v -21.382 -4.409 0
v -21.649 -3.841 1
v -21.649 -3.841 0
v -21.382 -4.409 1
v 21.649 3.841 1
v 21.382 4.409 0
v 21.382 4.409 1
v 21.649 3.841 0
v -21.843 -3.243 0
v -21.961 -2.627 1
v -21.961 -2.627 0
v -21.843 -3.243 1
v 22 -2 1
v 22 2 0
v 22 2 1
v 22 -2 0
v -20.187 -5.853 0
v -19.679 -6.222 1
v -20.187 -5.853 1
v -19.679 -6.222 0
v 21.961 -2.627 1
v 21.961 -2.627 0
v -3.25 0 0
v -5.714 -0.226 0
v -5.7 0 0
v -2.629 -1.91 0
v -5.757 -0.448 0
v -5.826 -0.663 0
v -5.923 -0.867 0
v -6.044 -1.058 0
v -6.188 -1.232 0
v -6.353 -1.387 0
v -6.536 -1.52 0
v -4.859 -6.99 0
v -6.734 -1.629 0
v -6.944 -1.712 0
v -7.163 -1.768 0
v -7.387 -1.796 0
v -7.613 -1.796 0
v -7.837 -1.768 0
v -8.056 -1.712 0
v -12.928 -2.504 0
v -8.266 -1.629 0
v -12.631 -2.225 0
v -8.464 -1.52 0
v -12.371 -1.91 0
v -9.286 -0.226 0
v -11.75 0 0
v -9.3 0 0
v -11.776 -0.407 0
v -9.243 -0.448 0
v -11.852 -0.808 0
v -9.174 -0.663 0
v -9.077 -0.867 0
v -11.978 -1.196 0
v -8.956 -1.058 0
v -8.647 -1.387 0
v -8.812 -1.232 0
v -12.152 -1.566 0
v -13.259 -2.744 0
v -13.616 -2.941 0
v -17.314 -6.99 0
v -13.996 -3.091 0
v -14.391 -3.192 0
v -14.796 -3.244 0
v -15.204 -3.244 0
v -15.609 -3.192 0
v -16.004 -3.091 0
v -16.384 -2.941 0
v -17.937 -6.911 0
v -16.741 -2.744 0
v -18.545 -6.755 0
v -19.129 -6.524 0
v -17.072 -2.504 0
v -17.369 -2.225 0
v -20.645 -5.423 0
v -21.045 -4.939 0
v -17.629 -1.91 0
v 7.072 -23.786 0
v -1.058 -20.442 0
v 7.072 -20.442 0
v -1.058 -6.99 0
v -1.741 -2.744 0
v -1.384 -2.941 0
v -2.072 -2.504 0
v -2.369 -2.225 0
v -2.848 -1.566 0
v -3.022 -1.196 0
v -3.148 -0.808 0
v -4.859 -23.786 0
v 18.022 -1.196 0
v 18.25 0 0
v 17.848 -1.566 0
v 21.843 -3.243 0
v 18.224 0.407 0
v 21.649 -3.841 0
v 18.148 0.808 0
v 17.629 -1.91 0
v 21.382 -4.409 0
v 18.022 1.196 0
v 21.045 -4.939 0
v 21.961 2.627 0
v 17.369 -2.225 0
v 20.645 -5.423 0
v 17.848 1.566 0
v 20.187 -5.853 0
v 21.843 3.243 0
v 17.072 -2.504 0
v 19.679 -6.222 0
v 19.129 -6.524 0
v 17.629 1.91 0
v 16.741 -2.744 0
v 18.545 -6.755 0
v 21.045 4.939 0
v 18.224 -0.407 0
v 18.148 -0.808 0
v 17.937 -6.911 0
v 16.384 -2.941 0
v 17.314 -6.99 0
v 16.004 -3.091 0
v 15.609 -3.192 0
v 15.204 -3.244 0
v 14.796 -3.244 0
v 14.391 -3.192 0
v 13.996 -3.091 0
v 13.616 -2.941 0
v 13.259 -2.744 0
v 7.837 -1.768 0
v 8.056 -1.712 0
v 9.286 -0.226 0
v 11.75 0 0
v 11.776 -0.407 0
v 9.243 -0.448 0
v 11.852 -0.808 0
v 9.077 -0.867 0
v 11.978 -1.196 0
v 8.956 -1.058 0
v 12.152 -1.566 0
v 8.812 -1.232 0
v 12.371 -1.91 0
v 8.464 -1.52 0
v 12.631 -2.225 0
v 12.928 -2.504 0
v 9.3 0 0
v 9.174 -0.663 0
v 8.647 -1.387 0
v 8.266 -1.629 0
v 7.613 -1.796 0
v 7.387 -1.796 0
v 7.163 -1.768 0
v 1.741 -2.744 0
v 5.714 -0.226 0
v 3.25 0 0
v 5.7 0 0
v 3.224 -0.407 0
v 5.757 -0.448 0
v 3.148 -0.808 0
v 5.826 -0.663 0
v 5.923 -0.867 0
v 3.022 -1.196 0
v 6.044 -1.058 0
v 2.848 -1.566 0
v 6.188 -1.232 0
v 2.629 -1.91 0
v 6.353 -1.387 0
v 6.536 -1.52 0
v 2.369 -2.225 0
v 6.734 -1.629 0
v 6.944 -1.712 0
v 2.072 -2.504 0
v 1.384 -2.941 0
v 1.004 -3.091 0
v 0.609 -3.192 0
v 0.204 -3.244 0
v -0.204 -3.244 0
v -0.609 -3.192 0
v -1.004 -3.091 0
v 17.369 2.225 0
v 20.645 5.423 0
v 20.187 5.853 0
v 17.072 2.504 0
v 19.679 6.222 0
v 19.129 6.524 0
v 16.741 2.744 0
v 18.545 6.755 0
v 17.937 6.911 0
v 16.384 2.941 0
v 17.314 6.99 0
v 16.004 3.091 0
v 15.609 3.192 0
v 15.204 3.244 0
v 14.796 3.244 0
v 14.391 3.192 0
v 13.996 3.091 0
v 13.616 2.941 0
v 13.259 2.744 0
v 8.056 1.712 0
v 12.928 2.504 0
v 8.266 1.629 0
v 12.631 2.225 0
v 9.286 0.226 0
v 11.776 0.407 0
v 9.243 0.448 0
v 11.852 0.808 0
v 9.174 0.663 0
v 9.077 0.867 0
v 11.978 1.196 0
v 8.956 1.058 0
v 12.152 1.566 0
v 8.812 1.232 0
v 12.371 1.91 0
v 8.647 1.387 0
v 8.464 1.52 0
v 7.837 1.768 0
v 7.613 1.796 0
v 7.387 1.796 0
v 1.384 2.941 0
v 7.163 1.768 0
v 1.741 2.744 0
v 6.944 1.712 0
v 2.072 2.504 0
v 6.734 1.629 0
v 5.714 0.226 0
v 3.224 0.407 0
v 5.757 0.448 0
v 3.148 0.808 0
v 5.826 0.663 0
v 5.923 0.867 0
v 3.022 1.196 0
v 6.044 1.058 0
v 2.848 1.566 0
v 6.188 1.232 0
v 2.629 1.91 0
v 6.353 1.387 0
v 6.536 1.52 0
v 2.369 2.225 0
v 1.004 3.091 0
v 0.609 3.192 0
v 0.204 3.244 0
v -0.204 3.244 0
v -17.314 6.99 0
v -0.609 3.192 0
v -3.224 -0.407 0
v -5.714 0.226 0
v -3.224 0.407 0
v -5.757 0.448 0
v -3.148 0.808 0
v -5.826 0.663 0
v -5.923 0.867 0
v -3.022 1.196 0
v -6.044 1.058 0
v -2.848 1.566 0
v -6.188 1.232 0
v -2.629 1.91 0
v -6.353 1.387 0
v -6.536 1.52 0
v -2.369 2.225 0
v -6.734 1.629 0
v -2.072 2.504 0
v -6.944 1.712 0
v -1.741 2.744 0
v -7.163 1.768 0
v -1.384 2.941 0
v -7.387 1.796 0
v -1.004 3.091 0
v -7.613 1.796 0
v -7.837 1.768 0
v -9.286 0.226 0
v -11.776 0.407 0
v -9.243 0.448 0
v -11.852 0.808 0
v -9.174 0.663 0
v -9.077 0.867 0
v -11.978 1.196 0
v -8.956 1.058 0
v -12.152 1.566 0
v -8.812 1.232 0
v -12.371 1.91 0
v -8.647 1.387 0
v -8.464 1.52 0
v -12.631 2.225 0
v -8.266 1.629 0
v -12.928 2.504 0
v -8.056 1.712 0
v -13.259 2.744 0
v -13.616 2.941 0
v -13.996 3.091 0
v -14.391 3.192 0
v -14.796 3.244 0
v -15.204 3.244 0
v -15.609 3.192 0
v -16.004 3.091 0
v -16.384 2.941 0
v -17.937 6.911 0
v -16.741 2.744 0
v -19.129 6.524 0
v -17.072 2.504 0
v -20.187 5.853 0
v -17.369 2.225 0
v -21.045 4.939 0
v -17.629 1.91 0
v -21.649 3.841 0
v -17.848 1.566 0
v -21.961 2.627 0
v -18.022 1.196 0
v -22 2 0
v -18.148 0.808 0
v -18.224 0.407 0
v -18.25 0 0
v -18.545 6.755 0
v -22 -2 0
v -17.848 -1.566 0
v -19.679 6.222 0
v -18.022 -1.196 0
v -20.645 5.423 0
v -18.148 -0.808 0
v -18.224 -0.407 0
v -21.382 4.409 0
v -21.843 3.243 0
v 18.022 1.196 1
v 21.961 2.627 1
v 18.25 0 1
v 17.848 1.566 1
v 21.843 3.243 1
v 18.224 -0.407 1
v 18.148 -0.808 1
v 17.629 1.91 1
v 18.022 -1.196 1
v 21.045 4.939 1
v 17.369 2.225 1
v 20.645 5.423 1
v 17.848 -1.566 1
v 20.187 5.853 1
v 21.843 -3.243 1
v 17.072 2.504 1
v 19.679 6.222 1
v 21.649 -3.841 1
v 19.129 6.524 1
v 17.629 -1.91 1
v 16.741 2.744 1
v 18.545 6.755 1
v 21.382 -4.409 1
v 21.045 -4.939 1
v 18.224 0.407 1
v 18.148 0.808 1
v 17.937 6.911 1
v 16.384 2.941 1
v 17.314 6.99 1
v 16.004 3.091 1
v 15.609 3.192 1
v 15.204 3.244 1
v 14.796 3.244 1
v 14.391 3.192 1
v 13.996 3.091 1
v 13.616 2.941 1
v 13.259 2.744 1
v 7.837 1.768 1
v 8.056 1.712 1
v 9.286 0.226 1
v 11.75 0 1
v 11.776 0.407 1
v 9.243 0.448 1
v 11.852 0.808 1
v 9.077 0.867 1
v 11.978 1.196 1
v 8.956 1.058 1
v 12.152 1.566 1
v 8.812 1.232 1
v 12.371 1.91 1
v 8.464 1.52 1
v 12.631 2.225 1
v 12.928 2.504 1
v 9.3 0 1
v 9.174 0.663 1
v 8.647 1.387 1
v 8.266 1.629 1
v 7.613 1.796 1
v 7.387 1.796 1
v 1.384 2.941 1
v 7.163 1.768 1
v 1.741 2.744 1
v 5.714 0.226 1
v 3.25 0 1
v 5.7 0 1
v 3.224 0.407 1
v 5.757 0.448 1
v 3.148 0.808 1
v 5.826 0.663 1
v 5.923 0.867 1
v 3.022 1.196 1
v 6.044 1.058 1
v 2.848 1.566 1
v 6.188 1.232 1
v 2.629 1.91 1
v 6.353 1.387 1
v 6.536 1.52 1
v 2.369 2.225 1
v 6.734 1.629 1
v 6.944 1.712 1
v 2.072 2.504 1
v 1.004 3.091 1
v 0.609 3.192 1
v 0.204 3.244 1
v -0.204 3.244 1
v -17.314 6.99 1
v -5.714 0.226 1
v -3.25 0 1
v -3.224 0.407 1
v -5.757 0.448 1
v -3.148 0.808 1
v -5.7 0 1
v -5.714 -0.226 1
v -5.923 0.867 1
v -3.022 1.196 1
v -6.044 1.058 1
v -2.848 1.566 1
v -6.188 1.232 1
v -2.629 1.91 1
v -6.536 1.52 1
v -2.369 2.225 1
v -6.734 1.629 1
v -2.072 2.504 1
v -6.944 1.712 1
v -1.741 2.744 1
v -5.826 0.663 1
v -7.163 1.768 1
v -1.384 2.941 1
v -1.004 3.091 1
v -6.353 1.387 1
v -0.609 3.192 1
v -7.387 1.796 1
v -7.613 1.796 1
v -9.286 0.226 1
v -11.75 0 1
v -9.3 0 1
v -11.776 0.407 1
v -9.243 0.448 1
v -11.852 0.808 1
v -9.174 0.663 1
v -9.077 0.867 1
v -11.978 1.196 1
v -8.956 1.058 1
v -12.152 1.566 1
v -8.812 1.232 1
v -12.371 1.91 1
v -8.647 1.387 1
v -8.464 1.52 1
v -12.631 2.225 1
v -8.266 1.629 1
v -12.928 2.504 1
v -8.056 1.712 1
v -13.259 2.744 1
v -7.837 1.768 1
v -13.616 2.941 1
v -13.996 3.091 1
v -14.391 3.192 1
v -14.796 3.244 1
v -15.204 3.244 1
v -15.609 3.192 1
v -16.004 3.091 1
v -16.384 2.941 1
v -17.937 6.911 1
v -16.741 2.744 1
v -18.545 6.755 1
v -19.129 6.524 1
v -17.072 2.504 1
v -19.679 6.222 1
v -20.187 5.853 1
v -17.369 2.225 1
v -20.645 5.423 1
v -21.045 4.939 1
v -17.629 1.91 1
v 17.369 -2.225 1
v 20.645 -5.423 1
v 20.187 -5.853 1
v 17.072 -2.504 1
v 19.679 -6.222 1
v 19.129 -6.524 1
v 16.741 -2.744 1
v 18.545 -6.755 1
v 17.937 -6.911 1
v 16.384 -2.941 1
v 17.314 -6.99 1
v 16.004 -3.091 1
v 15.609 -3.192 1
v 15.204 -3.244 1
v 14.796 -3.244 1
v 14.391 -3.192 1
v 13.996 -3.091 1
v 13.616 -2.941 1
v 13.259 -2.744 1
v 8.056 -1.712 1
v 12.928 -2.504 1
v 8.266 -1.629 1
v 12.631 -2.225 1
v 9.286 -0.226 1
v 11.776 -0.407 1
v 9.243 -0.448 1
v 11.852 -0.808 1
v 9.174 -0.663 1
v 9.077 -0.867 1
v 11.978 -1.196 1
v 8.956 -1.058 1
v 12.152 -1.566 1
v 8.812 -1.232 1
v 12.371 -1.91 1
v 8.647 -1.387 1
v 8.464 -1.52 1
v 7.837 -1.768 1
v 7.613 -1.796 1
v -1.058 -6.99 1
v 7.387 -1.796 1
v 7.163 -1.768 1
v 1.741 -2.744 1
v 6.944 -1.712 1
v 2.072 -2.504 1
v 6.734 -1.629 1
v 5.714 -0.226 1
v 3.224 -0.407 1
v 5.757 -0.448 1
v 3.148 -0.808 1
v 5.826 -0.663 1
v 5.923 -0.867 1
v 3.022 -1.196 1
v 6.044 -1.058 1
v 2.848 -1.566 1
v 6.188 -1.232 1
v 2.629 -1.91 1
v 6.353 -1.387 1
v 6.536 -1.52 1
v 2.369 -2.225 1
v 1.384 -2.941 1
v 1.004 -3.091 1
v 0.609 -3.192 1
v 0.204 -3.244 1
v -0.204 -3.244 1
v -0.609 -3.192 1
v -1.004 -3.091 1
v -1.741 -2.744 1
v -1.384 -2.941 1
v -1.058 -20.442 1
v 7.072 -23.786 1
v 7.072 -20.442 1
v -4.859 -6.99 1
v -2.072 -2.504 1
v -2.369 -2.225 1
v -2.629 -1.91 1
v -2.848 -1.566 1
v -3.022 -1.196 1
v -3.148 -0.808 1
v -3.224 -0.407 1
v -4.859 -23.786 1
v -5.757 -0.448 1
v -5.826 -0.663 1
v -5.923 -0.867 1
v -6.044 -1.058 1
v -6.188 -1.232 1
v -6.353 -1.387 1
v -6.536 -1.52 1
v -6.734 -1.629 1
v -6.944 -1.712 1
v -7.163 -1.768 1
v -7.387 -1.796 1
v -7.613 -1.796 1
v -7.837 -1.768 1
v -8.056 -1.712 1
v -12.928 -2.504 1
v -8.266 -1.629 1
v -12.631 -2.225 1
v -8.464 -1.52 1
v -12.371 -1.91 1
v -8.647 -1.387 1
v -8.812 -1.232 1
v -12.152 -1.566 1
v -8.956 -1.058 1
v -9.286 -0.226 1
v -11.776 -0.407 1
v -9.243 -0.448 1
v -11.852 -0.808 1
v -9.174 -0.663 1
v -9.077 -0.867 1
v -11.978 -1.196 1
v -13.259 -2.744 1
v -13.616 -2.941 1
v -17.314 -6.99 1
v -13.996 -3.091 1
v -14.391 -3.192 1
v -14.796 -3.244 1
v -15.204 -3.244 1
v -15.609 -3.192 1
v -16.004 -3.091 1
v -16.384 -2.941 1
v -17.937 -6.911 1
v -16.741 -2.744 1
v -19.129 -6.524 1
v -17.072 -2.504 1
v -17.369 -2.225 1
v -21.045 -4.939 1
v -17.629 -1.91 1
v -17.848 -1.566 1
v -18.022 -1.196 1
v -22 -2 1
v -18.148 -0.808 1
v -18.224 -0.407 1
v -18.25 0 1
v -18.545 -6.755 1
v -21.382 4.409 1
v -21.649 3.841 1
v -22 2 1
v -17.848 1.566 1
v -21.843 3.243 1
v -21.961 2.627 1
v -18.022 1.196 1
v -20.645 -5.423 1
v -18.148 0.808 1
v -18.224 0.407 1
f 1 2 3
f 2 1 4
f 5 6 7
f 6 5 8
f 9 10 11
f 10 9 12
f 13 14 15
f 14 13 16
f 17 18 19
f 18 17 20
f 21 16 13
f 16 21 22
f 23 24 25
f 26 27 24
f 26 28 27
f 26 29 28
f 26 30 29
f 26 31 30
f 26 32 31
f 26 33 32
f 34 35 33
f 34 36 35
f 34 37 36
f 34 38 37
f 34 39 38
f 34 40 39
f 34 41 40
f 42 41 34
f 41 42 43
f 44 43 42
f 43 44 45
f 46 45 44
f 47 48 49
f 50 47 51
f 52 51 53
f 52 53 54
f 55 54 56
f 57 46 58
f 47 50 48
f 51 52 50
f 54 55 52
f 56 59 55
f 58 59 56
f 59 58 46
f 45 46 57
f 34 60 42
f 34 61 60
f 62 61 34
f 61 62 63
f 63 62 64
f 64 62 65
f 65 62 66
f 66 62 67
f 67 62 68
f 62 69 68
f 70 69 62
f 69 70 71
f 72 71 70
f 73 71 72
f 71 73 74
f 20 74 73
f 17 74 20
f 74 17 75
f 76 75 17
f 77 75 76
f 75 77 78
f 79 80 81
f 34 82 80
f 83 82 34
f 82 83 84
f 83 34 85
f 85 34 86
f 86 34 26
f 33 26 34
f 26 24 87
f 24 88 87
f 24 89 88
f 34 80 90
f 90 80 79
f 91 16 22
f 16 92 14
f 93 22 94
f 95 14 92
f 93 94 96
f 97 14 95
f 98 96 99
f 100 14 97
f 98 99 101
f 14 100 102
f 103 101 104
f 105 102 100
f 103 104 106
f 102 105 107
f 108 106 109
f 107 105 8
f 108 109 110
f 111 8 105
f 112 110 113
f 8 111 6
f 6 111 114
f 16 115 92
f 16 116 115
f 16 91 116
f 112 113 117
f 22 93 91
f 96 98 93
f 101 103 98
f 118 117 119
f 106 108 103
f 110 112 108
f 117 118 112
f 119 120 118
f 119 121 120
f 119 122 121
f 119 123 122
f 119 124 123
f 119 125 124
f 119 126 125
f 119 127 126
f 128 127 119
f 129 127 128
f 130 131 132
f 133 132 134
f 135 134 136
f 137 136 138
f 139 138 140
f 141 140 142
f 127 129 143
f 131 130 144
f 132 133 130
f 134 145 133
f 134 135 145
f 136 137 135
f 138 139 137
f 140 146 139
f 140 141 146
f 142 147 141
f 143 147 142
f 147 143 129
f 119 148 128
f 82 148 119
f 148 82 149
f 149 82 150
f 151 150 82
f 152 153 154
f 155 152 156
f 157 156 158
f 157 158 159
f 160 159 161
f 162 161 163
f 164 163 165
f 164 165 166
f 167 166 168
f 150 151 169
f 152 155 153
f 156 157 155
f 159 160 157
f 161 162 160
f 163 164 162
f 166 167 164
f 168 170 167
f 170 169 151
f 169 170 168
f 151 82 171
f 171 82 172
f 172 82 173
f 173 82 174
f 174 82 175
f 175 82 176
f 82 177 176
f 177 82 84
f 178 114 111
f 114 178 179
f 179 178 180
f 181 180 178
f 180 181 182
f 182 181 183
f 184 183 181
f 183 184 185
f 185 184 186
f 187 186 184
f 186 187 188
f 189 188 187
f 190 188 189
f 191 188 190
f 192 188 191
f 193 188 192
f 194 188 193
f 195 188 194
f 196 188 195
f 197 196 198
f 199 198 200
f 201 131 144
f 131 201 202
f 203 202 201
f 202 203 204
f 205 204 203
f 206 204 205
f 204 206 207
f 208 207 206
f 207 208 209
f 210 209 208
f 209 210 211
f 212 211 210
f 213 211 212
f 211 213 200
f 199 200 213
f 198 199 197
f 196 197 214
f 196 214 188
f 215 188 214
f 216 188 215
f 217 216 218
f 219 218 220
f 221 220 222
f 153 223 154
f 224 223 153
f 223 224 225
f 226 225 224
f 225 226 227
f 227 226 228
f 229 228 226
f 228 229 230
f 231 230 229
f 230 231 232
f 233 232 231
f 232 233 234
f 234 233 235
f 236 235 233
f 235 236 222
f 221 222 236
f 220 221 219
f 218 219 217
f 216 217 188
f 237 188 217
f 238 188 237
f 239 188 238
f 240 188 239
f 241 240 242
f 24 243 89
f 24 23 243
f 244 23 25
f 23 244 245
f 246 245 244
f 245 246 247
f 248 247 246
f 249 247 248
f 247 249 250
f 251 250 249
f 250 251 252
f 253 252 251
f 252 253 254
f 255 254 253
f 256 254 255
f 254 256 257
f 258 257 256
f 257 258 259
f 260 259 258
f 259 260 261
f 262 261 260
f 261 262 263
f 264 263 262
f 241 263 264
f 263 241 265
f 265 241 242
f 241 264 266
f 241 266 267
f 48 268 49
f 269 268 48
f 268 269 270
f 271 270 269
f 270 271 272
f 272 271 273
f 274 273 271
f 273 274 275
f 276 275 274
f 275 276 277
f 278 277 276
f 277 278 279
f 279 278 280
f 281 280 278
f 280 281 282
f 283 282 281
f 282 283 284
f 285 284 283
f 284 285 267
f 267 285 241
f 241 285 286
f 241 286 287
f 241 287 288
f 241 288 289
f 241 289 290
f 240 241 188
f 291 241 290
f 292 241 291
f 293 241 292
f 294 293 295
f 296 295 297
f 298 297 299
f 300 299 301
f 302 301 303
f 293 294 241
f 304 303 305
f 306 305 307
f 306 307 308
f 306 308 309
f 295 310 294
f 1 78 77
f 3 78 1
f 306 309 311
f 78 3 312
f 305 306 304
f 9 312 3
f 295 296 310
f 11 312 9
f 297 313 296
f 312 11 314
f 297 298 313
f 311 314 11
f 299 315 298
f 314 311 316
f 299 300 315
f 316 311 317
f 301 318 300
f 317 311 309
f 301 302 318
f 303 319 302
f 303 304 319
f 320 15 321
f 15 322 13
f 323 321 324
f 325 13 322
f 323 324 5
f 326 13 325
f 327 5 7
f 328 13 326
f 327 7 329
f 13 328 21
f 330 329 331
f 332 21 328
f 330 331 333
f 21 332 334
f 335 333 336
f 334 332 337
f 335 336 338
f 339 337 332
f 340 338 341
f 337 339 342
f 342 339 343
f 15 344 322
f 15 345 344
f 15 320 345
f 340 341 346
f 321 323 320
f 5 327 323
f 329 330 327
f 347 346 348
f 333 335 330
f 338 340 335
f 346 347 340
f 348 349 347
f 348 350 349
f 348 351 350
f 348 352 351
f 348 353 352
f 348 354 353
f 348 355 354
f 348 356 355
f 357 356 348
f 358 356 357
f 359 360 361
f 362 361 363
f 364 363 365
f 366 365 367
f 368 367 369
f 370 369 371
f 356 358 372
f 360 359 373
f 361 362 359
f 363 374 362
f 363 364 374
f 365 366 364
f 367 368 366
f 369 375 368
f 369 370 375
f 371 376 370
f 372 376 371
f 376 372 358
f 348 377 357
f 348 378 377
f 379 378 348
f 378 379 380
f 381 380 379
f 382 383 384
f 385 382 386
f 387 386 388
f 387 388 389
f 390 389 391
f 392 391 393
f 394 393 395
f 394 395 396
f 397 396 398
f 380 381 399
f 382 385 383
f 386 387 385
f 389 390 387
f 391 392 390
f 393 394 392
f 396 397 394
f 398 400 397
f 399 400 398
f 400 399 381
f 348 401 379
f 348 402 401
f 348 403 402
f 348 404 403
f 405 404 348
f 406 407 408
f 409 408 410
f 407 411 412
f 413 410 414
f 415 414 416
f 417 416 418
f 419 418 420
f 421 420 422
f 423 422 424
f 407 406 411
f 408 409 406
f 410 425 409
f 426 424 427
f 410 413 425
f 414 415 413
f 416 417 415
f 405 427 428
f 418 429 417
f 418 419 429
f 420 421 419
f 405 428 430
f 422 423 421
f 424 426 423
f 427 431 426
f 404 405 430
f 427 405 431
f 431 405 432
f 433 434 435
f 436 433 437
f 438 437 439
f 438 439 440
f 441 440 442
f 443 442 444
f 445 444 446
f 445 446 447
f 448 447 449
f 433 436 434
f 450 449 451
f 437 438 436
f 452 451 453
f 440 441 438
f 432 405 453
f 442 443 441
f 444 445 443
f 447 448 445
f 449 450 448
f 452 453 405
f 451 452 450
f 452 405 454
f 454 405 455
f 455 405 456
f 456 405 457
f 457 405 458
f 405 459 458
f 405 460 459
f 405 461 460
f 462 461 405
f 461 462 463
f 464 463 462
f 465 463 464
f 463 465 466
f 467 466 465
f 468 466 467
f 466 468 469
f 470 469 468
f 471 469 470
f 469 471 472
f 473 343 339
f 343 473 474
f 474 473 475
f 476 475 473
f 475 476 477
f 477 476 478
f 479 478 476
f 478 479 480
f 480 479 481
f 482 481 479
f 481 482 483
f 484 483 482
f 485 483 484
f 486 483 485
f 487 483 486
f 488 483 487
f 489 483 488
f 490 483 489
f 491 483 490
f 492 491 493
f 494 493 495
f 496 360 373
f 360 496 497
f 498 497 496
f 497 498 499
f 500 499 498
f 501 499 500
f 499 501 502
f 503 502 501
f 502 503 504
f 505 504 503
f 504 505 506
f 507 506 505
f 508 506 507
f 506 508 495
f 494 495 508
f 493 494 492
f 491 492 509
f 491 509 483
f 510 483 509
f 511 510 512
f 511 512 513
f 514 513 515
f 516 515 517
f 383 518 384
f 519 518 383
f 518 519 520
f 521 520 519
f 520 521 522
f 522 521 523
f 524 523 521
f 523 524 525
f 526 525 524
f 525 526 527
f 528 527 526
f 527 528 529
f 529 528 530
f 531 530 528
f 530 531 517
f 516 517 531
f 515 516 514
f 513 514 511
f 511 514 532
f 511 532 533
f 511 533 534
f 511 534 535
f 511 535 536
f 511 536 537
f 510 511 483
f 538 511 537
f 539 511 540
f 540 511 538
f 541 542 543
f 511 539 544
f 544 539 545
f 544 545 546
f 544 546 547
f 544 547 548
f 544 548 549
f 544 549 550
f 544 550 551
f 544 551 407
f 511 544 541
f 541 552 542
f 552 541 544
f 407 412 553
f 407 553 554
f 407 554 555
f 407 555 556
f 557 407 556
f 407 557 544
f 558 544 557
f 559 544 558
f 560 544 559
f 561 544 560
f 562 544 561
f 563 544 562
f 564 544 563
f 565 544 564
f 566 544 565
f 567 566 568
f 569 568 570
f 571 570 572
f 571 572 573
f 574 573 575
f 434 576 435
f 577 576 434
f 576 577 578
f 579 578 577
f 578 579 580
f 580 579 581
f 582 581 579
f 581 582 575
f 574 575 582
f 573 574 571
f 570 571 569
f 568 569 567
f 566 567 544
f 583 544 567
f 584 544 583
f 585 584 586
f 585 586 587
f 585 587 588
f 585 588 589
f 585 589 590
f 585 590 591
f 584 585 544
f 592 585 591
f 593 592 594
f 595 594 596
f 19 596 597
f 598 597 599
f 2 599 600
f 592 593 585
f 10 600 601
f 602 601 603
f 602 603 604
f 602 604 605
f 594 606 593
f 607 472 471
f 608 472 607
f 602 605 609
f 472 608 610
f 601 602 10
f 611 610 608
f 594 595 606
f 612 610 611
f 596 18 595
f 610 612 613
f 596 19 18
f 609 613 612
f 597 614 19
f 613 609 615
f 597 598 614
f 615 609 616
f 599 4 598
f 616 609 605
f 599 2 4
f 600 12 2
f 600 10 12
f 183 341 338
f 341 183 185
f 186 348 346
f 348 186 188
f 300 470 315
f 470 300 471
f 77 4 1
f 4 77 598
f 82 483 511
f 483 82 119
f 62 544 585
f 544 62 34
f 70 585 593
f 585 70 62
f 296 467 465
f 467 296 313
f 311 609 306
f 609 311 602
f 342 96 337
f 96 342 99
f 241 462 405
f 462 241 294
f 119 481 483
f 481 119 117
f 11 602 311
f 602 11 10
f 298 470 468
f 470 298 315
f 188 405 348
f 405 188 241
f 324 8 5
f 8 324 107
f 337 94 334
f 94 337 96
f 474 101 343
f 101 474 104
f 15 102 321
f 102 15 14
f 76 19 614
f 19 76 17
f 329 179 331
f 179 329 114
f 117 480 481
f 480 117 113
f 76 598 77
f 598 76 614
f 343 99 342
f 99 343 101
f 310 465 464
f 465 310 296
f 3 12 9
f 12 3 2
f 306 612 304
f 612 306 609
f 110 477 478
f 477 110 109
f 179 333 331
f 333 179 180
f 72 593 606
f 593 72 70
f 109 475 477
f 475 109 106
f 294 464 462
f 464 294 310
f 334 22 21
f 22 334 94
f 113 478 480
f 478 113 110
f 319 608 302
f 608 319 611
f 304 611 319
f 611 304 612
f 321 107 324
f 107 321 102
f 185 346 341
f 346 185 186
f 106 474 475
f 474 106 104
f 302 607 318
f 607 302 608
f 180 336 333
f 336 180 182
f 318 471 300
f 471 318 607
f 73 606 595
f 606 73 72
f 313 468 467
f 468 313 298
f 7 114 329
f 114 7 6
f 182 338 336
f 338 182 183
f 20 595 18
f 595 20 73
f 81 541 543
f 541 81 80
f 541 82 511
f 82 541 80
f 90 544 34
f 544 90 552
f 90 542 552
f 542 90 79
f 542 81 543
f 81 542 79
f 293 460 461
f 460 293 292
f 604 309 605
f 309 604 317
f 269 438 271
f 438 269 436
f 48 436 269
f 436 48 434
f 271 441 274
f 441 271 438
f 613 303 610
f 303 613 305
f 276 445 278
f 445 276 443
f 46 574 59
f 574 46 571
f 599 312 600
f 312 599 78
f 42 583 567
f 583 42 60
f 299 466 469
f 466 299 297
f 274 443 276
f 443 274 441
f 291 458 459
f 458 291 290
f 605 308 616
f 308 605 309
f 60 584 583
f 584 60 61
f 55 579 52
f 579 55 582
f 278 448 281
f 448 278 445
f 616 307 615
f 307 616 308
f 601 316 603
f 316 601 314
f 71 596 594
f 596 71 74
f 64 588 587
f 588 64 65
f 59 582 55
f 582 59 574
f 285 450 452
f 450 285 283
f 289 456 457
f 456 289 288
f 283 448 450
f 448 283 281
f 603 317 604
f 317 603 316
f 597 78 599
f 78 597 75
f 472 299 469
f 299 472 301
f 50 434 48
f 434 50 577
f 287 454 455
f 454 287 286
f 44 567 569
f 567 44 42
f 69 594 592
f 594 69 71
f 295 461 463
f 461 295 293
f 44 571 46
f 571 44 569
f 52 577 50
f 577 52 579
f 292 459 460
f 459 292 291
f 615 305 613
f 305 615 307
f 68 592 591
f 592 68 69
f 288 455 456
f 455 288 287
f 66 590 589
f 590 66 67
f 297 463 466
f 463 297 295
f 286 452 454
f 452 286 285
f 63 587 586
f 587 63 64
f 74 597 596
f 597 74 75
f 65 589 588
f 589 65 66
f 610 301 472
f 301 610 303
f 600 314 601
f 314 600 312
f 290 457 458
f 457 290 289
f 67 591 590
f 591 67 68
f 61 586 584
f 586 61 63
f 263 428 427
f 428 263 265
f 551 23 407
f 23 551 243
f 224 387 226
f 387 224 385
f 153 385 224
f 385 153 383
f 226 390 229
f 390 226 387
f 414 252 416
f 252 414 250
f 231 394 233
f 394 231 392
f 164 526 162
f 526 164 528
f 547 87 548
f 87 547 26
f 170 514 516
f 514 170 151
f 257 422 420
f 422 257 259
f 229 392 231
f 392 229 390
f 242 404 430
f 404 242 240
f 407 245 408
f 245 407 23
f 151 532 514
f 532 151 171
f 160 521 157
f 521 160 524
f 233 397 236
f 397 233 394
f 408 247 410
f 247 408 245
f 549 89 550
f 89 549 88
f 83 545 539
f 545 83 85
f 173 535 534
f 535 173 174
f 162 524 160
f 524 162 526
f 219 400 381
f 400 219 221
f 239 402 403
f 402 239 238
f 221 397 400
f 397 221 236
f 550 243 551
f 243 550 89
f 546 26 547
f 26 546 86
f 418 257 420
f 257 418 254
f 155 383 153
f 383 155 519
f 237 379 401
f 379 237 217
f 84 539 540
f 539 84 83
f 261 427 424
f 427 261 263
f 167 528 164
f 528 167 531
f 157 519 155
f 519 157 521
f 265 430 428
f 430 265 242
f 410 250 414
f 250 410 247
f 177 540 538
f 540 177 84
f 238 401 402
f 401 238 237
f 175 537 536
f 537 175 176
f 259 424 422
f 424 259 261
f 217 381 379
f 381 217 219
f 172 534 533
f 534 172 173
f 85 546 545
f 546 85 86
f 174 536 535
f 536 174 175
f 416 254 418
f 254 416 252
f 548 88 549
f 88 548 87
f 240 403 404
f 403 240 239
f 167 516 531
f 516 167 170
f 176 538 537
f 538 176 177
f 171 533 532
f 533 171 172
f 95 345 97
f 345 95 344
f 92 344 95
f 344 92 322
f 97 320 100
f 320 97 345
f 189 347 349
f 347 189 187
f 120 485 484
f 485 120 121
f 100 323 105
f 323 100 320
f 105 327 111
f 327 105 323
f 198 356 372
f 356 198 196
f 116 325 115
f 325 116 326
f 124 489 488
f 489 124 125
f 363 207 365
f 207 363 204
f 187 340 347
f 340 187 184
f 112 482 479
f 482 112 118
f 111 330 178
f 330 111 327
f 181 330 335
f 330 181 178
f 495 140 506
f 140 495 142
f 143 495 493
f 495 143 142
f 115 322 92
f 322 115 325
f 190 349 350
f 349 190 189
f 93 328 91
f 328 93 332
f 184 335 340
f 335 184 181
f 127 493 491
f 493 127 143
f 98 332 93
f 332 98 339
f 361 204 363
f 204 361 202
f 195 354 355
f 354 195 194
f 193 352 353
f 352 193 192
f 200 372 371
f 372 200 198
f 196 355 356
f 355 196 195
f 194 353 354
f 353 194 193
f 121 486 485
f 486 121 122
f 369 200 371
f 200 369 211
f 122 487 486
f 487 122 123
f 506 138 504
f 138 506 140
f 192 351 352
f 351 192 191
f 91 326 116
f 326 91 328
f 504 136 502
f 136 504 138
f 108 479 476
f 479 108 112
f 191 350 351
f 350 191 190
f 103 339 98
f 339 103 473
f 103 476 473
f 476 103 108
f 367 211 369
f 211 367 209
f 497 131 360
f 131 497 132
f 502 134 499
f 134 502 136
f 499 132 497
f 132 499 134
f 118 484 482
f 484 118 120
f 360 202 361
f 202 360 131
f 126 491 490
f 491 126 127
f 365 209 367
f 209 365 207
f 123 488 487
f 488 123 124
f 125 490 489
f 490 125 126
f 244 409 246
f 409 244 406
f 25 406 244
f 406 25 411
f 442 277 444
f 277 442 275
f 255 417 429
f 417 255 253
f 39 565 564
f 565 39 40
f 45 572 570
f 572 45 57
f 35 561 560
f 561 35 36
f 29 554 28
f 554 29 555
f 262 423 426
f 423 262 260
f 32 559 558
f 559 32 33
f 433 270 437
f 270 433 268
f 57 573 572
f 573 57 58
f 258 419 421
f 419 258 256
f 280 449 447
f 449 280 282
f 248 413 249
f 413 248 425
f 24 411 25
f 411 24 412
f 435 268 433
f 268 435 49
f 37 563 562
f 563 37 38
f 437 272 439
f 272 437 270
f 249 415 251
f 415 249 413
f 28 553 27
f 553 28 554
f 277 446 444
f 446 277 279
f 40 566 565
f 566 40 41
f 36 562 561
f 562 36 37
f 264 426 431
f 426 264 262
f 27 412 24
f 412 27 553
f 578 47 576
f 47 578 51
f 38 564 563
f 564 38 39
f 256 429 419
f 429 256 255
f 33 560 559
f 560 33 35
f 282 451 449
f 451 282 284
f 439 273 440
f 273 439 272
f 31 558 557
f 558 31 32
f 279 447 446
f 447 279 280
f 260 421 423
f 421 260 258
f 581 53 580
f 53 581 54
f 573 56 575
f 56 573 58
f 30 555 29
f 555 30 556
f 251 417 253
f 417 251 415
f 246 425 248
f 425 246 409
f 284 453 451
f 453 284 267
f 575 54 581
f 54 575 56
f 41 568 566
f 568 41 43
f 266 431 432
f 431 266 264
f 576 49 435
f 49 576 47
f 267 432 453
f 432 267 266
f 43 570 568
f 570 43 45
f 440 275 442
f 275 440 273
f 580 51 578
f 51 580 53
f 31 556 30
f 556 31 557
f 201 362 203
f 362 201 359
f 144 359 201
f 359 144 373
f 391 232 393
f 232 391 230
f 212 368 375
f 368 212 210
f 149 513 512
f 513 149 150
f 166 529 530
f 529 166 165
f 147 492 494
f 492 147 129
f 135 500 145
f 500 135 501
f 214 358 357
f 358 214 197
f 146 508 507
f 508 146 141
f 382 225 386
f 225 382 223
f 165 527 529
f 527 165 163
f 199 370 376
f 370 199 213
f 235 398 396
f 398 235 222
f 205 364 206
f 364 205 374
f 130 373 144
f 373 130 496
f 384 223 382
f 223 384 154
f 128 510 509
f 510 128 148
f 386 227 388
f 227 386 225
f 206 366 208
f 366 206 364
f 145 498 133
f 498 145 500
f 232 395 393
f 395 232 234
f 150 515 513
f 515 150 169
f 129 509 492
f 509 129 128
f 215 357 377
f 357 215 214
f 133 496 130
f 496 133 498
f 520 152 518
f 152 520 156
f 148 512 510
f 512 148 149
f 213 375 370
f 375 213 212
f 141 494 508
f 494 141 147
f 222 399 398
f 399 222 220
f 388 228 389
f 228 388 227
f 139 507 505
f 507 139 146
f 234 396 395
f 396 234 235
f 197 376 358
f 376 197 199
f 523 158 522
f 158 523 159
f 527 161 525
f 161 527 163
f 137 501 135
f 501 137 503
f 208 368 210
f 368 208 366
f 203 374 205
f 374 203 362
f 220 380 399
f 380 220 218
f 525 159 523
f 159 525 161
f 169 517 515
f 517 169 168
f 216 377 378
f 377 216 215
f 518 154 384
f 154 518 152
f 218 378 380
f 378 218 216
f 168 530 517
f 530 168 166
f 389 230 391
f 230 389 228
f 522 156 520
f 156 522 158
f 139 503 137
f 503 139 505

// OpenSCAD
$fn = 50;


difference() {
	union() {
		hull() {
			translate(v = [-17.0000000000, 2.0000000000, 0]) {
				cylinder(h = 1, r = 5);
			}
			translate(v = [17.0000000000, 2.0000000000, 0]) {
				cylinder(h = 1, r = 5);
			}
			translate(v = [-17.0000000000, -2.0000000000, 0]) {
				cylinder(h = 1, r = 5);
			}
			translate(v = [17.0000000000, -2.0000000000, 0]) {
				cylinder(h = 1, r = 5);
			}
		}
		translate(v = [0, -5, 0]) {
			linear_extrude(height = 1) {
				text(font = "DejaVu Sans Mono:style=Bold", halign = "center", size = 19.0000000000, text = "L", valign = "top");
			}
		}
	}
	union() {
		translate(v = [-15.0000000000, 0.0000000000, 0]) {
			translate(v = [0, 0, -100]) {
				cylinder(h = 200, r = 3.2500000000);
			}
		}
		translate(v = [0, 0, -100]) {
			cylinder(h = 200, r = 3.2500000000);
		}
		translate(v = [15.0000000000, 0.0000000000, 0]) {
			translate(v = [0, 0, -100]) {
				cylinder(h = 200, r = 3.2500000000);
			}
		}
		translate(v = [-15.0000000000, 0.0000000000, 0]) {
			translate(v = [0, 0, -100]) {
				cylinder(h = 200, r = 1.8000000000);
			}
		}
		translate(v = [-7.5000000000, 0.0000000000, 0]) {
			translate(v = [0, 0, -100]) {
				cylinder(h = 200, r = 1.8000000000);
			}
		}
		translate(v = [0, 0, -100]) {
			cylinder(h = 200, r = 1.8000000000);
		}
		translate(v = [7.5000000000, 0.0000000000, 0]) {
			translate(v = [0, 0, -100]) {
				cylinder(h = 200, r = 1.8000000000);
			}
		}
		translate(v = [15.0000000000, 0.0000000000, 0]) {
			translate(v = [0, 0, -100]) {
				cylinder(h = 200, r = 1.8000000000);
			}
		}
	}
}
